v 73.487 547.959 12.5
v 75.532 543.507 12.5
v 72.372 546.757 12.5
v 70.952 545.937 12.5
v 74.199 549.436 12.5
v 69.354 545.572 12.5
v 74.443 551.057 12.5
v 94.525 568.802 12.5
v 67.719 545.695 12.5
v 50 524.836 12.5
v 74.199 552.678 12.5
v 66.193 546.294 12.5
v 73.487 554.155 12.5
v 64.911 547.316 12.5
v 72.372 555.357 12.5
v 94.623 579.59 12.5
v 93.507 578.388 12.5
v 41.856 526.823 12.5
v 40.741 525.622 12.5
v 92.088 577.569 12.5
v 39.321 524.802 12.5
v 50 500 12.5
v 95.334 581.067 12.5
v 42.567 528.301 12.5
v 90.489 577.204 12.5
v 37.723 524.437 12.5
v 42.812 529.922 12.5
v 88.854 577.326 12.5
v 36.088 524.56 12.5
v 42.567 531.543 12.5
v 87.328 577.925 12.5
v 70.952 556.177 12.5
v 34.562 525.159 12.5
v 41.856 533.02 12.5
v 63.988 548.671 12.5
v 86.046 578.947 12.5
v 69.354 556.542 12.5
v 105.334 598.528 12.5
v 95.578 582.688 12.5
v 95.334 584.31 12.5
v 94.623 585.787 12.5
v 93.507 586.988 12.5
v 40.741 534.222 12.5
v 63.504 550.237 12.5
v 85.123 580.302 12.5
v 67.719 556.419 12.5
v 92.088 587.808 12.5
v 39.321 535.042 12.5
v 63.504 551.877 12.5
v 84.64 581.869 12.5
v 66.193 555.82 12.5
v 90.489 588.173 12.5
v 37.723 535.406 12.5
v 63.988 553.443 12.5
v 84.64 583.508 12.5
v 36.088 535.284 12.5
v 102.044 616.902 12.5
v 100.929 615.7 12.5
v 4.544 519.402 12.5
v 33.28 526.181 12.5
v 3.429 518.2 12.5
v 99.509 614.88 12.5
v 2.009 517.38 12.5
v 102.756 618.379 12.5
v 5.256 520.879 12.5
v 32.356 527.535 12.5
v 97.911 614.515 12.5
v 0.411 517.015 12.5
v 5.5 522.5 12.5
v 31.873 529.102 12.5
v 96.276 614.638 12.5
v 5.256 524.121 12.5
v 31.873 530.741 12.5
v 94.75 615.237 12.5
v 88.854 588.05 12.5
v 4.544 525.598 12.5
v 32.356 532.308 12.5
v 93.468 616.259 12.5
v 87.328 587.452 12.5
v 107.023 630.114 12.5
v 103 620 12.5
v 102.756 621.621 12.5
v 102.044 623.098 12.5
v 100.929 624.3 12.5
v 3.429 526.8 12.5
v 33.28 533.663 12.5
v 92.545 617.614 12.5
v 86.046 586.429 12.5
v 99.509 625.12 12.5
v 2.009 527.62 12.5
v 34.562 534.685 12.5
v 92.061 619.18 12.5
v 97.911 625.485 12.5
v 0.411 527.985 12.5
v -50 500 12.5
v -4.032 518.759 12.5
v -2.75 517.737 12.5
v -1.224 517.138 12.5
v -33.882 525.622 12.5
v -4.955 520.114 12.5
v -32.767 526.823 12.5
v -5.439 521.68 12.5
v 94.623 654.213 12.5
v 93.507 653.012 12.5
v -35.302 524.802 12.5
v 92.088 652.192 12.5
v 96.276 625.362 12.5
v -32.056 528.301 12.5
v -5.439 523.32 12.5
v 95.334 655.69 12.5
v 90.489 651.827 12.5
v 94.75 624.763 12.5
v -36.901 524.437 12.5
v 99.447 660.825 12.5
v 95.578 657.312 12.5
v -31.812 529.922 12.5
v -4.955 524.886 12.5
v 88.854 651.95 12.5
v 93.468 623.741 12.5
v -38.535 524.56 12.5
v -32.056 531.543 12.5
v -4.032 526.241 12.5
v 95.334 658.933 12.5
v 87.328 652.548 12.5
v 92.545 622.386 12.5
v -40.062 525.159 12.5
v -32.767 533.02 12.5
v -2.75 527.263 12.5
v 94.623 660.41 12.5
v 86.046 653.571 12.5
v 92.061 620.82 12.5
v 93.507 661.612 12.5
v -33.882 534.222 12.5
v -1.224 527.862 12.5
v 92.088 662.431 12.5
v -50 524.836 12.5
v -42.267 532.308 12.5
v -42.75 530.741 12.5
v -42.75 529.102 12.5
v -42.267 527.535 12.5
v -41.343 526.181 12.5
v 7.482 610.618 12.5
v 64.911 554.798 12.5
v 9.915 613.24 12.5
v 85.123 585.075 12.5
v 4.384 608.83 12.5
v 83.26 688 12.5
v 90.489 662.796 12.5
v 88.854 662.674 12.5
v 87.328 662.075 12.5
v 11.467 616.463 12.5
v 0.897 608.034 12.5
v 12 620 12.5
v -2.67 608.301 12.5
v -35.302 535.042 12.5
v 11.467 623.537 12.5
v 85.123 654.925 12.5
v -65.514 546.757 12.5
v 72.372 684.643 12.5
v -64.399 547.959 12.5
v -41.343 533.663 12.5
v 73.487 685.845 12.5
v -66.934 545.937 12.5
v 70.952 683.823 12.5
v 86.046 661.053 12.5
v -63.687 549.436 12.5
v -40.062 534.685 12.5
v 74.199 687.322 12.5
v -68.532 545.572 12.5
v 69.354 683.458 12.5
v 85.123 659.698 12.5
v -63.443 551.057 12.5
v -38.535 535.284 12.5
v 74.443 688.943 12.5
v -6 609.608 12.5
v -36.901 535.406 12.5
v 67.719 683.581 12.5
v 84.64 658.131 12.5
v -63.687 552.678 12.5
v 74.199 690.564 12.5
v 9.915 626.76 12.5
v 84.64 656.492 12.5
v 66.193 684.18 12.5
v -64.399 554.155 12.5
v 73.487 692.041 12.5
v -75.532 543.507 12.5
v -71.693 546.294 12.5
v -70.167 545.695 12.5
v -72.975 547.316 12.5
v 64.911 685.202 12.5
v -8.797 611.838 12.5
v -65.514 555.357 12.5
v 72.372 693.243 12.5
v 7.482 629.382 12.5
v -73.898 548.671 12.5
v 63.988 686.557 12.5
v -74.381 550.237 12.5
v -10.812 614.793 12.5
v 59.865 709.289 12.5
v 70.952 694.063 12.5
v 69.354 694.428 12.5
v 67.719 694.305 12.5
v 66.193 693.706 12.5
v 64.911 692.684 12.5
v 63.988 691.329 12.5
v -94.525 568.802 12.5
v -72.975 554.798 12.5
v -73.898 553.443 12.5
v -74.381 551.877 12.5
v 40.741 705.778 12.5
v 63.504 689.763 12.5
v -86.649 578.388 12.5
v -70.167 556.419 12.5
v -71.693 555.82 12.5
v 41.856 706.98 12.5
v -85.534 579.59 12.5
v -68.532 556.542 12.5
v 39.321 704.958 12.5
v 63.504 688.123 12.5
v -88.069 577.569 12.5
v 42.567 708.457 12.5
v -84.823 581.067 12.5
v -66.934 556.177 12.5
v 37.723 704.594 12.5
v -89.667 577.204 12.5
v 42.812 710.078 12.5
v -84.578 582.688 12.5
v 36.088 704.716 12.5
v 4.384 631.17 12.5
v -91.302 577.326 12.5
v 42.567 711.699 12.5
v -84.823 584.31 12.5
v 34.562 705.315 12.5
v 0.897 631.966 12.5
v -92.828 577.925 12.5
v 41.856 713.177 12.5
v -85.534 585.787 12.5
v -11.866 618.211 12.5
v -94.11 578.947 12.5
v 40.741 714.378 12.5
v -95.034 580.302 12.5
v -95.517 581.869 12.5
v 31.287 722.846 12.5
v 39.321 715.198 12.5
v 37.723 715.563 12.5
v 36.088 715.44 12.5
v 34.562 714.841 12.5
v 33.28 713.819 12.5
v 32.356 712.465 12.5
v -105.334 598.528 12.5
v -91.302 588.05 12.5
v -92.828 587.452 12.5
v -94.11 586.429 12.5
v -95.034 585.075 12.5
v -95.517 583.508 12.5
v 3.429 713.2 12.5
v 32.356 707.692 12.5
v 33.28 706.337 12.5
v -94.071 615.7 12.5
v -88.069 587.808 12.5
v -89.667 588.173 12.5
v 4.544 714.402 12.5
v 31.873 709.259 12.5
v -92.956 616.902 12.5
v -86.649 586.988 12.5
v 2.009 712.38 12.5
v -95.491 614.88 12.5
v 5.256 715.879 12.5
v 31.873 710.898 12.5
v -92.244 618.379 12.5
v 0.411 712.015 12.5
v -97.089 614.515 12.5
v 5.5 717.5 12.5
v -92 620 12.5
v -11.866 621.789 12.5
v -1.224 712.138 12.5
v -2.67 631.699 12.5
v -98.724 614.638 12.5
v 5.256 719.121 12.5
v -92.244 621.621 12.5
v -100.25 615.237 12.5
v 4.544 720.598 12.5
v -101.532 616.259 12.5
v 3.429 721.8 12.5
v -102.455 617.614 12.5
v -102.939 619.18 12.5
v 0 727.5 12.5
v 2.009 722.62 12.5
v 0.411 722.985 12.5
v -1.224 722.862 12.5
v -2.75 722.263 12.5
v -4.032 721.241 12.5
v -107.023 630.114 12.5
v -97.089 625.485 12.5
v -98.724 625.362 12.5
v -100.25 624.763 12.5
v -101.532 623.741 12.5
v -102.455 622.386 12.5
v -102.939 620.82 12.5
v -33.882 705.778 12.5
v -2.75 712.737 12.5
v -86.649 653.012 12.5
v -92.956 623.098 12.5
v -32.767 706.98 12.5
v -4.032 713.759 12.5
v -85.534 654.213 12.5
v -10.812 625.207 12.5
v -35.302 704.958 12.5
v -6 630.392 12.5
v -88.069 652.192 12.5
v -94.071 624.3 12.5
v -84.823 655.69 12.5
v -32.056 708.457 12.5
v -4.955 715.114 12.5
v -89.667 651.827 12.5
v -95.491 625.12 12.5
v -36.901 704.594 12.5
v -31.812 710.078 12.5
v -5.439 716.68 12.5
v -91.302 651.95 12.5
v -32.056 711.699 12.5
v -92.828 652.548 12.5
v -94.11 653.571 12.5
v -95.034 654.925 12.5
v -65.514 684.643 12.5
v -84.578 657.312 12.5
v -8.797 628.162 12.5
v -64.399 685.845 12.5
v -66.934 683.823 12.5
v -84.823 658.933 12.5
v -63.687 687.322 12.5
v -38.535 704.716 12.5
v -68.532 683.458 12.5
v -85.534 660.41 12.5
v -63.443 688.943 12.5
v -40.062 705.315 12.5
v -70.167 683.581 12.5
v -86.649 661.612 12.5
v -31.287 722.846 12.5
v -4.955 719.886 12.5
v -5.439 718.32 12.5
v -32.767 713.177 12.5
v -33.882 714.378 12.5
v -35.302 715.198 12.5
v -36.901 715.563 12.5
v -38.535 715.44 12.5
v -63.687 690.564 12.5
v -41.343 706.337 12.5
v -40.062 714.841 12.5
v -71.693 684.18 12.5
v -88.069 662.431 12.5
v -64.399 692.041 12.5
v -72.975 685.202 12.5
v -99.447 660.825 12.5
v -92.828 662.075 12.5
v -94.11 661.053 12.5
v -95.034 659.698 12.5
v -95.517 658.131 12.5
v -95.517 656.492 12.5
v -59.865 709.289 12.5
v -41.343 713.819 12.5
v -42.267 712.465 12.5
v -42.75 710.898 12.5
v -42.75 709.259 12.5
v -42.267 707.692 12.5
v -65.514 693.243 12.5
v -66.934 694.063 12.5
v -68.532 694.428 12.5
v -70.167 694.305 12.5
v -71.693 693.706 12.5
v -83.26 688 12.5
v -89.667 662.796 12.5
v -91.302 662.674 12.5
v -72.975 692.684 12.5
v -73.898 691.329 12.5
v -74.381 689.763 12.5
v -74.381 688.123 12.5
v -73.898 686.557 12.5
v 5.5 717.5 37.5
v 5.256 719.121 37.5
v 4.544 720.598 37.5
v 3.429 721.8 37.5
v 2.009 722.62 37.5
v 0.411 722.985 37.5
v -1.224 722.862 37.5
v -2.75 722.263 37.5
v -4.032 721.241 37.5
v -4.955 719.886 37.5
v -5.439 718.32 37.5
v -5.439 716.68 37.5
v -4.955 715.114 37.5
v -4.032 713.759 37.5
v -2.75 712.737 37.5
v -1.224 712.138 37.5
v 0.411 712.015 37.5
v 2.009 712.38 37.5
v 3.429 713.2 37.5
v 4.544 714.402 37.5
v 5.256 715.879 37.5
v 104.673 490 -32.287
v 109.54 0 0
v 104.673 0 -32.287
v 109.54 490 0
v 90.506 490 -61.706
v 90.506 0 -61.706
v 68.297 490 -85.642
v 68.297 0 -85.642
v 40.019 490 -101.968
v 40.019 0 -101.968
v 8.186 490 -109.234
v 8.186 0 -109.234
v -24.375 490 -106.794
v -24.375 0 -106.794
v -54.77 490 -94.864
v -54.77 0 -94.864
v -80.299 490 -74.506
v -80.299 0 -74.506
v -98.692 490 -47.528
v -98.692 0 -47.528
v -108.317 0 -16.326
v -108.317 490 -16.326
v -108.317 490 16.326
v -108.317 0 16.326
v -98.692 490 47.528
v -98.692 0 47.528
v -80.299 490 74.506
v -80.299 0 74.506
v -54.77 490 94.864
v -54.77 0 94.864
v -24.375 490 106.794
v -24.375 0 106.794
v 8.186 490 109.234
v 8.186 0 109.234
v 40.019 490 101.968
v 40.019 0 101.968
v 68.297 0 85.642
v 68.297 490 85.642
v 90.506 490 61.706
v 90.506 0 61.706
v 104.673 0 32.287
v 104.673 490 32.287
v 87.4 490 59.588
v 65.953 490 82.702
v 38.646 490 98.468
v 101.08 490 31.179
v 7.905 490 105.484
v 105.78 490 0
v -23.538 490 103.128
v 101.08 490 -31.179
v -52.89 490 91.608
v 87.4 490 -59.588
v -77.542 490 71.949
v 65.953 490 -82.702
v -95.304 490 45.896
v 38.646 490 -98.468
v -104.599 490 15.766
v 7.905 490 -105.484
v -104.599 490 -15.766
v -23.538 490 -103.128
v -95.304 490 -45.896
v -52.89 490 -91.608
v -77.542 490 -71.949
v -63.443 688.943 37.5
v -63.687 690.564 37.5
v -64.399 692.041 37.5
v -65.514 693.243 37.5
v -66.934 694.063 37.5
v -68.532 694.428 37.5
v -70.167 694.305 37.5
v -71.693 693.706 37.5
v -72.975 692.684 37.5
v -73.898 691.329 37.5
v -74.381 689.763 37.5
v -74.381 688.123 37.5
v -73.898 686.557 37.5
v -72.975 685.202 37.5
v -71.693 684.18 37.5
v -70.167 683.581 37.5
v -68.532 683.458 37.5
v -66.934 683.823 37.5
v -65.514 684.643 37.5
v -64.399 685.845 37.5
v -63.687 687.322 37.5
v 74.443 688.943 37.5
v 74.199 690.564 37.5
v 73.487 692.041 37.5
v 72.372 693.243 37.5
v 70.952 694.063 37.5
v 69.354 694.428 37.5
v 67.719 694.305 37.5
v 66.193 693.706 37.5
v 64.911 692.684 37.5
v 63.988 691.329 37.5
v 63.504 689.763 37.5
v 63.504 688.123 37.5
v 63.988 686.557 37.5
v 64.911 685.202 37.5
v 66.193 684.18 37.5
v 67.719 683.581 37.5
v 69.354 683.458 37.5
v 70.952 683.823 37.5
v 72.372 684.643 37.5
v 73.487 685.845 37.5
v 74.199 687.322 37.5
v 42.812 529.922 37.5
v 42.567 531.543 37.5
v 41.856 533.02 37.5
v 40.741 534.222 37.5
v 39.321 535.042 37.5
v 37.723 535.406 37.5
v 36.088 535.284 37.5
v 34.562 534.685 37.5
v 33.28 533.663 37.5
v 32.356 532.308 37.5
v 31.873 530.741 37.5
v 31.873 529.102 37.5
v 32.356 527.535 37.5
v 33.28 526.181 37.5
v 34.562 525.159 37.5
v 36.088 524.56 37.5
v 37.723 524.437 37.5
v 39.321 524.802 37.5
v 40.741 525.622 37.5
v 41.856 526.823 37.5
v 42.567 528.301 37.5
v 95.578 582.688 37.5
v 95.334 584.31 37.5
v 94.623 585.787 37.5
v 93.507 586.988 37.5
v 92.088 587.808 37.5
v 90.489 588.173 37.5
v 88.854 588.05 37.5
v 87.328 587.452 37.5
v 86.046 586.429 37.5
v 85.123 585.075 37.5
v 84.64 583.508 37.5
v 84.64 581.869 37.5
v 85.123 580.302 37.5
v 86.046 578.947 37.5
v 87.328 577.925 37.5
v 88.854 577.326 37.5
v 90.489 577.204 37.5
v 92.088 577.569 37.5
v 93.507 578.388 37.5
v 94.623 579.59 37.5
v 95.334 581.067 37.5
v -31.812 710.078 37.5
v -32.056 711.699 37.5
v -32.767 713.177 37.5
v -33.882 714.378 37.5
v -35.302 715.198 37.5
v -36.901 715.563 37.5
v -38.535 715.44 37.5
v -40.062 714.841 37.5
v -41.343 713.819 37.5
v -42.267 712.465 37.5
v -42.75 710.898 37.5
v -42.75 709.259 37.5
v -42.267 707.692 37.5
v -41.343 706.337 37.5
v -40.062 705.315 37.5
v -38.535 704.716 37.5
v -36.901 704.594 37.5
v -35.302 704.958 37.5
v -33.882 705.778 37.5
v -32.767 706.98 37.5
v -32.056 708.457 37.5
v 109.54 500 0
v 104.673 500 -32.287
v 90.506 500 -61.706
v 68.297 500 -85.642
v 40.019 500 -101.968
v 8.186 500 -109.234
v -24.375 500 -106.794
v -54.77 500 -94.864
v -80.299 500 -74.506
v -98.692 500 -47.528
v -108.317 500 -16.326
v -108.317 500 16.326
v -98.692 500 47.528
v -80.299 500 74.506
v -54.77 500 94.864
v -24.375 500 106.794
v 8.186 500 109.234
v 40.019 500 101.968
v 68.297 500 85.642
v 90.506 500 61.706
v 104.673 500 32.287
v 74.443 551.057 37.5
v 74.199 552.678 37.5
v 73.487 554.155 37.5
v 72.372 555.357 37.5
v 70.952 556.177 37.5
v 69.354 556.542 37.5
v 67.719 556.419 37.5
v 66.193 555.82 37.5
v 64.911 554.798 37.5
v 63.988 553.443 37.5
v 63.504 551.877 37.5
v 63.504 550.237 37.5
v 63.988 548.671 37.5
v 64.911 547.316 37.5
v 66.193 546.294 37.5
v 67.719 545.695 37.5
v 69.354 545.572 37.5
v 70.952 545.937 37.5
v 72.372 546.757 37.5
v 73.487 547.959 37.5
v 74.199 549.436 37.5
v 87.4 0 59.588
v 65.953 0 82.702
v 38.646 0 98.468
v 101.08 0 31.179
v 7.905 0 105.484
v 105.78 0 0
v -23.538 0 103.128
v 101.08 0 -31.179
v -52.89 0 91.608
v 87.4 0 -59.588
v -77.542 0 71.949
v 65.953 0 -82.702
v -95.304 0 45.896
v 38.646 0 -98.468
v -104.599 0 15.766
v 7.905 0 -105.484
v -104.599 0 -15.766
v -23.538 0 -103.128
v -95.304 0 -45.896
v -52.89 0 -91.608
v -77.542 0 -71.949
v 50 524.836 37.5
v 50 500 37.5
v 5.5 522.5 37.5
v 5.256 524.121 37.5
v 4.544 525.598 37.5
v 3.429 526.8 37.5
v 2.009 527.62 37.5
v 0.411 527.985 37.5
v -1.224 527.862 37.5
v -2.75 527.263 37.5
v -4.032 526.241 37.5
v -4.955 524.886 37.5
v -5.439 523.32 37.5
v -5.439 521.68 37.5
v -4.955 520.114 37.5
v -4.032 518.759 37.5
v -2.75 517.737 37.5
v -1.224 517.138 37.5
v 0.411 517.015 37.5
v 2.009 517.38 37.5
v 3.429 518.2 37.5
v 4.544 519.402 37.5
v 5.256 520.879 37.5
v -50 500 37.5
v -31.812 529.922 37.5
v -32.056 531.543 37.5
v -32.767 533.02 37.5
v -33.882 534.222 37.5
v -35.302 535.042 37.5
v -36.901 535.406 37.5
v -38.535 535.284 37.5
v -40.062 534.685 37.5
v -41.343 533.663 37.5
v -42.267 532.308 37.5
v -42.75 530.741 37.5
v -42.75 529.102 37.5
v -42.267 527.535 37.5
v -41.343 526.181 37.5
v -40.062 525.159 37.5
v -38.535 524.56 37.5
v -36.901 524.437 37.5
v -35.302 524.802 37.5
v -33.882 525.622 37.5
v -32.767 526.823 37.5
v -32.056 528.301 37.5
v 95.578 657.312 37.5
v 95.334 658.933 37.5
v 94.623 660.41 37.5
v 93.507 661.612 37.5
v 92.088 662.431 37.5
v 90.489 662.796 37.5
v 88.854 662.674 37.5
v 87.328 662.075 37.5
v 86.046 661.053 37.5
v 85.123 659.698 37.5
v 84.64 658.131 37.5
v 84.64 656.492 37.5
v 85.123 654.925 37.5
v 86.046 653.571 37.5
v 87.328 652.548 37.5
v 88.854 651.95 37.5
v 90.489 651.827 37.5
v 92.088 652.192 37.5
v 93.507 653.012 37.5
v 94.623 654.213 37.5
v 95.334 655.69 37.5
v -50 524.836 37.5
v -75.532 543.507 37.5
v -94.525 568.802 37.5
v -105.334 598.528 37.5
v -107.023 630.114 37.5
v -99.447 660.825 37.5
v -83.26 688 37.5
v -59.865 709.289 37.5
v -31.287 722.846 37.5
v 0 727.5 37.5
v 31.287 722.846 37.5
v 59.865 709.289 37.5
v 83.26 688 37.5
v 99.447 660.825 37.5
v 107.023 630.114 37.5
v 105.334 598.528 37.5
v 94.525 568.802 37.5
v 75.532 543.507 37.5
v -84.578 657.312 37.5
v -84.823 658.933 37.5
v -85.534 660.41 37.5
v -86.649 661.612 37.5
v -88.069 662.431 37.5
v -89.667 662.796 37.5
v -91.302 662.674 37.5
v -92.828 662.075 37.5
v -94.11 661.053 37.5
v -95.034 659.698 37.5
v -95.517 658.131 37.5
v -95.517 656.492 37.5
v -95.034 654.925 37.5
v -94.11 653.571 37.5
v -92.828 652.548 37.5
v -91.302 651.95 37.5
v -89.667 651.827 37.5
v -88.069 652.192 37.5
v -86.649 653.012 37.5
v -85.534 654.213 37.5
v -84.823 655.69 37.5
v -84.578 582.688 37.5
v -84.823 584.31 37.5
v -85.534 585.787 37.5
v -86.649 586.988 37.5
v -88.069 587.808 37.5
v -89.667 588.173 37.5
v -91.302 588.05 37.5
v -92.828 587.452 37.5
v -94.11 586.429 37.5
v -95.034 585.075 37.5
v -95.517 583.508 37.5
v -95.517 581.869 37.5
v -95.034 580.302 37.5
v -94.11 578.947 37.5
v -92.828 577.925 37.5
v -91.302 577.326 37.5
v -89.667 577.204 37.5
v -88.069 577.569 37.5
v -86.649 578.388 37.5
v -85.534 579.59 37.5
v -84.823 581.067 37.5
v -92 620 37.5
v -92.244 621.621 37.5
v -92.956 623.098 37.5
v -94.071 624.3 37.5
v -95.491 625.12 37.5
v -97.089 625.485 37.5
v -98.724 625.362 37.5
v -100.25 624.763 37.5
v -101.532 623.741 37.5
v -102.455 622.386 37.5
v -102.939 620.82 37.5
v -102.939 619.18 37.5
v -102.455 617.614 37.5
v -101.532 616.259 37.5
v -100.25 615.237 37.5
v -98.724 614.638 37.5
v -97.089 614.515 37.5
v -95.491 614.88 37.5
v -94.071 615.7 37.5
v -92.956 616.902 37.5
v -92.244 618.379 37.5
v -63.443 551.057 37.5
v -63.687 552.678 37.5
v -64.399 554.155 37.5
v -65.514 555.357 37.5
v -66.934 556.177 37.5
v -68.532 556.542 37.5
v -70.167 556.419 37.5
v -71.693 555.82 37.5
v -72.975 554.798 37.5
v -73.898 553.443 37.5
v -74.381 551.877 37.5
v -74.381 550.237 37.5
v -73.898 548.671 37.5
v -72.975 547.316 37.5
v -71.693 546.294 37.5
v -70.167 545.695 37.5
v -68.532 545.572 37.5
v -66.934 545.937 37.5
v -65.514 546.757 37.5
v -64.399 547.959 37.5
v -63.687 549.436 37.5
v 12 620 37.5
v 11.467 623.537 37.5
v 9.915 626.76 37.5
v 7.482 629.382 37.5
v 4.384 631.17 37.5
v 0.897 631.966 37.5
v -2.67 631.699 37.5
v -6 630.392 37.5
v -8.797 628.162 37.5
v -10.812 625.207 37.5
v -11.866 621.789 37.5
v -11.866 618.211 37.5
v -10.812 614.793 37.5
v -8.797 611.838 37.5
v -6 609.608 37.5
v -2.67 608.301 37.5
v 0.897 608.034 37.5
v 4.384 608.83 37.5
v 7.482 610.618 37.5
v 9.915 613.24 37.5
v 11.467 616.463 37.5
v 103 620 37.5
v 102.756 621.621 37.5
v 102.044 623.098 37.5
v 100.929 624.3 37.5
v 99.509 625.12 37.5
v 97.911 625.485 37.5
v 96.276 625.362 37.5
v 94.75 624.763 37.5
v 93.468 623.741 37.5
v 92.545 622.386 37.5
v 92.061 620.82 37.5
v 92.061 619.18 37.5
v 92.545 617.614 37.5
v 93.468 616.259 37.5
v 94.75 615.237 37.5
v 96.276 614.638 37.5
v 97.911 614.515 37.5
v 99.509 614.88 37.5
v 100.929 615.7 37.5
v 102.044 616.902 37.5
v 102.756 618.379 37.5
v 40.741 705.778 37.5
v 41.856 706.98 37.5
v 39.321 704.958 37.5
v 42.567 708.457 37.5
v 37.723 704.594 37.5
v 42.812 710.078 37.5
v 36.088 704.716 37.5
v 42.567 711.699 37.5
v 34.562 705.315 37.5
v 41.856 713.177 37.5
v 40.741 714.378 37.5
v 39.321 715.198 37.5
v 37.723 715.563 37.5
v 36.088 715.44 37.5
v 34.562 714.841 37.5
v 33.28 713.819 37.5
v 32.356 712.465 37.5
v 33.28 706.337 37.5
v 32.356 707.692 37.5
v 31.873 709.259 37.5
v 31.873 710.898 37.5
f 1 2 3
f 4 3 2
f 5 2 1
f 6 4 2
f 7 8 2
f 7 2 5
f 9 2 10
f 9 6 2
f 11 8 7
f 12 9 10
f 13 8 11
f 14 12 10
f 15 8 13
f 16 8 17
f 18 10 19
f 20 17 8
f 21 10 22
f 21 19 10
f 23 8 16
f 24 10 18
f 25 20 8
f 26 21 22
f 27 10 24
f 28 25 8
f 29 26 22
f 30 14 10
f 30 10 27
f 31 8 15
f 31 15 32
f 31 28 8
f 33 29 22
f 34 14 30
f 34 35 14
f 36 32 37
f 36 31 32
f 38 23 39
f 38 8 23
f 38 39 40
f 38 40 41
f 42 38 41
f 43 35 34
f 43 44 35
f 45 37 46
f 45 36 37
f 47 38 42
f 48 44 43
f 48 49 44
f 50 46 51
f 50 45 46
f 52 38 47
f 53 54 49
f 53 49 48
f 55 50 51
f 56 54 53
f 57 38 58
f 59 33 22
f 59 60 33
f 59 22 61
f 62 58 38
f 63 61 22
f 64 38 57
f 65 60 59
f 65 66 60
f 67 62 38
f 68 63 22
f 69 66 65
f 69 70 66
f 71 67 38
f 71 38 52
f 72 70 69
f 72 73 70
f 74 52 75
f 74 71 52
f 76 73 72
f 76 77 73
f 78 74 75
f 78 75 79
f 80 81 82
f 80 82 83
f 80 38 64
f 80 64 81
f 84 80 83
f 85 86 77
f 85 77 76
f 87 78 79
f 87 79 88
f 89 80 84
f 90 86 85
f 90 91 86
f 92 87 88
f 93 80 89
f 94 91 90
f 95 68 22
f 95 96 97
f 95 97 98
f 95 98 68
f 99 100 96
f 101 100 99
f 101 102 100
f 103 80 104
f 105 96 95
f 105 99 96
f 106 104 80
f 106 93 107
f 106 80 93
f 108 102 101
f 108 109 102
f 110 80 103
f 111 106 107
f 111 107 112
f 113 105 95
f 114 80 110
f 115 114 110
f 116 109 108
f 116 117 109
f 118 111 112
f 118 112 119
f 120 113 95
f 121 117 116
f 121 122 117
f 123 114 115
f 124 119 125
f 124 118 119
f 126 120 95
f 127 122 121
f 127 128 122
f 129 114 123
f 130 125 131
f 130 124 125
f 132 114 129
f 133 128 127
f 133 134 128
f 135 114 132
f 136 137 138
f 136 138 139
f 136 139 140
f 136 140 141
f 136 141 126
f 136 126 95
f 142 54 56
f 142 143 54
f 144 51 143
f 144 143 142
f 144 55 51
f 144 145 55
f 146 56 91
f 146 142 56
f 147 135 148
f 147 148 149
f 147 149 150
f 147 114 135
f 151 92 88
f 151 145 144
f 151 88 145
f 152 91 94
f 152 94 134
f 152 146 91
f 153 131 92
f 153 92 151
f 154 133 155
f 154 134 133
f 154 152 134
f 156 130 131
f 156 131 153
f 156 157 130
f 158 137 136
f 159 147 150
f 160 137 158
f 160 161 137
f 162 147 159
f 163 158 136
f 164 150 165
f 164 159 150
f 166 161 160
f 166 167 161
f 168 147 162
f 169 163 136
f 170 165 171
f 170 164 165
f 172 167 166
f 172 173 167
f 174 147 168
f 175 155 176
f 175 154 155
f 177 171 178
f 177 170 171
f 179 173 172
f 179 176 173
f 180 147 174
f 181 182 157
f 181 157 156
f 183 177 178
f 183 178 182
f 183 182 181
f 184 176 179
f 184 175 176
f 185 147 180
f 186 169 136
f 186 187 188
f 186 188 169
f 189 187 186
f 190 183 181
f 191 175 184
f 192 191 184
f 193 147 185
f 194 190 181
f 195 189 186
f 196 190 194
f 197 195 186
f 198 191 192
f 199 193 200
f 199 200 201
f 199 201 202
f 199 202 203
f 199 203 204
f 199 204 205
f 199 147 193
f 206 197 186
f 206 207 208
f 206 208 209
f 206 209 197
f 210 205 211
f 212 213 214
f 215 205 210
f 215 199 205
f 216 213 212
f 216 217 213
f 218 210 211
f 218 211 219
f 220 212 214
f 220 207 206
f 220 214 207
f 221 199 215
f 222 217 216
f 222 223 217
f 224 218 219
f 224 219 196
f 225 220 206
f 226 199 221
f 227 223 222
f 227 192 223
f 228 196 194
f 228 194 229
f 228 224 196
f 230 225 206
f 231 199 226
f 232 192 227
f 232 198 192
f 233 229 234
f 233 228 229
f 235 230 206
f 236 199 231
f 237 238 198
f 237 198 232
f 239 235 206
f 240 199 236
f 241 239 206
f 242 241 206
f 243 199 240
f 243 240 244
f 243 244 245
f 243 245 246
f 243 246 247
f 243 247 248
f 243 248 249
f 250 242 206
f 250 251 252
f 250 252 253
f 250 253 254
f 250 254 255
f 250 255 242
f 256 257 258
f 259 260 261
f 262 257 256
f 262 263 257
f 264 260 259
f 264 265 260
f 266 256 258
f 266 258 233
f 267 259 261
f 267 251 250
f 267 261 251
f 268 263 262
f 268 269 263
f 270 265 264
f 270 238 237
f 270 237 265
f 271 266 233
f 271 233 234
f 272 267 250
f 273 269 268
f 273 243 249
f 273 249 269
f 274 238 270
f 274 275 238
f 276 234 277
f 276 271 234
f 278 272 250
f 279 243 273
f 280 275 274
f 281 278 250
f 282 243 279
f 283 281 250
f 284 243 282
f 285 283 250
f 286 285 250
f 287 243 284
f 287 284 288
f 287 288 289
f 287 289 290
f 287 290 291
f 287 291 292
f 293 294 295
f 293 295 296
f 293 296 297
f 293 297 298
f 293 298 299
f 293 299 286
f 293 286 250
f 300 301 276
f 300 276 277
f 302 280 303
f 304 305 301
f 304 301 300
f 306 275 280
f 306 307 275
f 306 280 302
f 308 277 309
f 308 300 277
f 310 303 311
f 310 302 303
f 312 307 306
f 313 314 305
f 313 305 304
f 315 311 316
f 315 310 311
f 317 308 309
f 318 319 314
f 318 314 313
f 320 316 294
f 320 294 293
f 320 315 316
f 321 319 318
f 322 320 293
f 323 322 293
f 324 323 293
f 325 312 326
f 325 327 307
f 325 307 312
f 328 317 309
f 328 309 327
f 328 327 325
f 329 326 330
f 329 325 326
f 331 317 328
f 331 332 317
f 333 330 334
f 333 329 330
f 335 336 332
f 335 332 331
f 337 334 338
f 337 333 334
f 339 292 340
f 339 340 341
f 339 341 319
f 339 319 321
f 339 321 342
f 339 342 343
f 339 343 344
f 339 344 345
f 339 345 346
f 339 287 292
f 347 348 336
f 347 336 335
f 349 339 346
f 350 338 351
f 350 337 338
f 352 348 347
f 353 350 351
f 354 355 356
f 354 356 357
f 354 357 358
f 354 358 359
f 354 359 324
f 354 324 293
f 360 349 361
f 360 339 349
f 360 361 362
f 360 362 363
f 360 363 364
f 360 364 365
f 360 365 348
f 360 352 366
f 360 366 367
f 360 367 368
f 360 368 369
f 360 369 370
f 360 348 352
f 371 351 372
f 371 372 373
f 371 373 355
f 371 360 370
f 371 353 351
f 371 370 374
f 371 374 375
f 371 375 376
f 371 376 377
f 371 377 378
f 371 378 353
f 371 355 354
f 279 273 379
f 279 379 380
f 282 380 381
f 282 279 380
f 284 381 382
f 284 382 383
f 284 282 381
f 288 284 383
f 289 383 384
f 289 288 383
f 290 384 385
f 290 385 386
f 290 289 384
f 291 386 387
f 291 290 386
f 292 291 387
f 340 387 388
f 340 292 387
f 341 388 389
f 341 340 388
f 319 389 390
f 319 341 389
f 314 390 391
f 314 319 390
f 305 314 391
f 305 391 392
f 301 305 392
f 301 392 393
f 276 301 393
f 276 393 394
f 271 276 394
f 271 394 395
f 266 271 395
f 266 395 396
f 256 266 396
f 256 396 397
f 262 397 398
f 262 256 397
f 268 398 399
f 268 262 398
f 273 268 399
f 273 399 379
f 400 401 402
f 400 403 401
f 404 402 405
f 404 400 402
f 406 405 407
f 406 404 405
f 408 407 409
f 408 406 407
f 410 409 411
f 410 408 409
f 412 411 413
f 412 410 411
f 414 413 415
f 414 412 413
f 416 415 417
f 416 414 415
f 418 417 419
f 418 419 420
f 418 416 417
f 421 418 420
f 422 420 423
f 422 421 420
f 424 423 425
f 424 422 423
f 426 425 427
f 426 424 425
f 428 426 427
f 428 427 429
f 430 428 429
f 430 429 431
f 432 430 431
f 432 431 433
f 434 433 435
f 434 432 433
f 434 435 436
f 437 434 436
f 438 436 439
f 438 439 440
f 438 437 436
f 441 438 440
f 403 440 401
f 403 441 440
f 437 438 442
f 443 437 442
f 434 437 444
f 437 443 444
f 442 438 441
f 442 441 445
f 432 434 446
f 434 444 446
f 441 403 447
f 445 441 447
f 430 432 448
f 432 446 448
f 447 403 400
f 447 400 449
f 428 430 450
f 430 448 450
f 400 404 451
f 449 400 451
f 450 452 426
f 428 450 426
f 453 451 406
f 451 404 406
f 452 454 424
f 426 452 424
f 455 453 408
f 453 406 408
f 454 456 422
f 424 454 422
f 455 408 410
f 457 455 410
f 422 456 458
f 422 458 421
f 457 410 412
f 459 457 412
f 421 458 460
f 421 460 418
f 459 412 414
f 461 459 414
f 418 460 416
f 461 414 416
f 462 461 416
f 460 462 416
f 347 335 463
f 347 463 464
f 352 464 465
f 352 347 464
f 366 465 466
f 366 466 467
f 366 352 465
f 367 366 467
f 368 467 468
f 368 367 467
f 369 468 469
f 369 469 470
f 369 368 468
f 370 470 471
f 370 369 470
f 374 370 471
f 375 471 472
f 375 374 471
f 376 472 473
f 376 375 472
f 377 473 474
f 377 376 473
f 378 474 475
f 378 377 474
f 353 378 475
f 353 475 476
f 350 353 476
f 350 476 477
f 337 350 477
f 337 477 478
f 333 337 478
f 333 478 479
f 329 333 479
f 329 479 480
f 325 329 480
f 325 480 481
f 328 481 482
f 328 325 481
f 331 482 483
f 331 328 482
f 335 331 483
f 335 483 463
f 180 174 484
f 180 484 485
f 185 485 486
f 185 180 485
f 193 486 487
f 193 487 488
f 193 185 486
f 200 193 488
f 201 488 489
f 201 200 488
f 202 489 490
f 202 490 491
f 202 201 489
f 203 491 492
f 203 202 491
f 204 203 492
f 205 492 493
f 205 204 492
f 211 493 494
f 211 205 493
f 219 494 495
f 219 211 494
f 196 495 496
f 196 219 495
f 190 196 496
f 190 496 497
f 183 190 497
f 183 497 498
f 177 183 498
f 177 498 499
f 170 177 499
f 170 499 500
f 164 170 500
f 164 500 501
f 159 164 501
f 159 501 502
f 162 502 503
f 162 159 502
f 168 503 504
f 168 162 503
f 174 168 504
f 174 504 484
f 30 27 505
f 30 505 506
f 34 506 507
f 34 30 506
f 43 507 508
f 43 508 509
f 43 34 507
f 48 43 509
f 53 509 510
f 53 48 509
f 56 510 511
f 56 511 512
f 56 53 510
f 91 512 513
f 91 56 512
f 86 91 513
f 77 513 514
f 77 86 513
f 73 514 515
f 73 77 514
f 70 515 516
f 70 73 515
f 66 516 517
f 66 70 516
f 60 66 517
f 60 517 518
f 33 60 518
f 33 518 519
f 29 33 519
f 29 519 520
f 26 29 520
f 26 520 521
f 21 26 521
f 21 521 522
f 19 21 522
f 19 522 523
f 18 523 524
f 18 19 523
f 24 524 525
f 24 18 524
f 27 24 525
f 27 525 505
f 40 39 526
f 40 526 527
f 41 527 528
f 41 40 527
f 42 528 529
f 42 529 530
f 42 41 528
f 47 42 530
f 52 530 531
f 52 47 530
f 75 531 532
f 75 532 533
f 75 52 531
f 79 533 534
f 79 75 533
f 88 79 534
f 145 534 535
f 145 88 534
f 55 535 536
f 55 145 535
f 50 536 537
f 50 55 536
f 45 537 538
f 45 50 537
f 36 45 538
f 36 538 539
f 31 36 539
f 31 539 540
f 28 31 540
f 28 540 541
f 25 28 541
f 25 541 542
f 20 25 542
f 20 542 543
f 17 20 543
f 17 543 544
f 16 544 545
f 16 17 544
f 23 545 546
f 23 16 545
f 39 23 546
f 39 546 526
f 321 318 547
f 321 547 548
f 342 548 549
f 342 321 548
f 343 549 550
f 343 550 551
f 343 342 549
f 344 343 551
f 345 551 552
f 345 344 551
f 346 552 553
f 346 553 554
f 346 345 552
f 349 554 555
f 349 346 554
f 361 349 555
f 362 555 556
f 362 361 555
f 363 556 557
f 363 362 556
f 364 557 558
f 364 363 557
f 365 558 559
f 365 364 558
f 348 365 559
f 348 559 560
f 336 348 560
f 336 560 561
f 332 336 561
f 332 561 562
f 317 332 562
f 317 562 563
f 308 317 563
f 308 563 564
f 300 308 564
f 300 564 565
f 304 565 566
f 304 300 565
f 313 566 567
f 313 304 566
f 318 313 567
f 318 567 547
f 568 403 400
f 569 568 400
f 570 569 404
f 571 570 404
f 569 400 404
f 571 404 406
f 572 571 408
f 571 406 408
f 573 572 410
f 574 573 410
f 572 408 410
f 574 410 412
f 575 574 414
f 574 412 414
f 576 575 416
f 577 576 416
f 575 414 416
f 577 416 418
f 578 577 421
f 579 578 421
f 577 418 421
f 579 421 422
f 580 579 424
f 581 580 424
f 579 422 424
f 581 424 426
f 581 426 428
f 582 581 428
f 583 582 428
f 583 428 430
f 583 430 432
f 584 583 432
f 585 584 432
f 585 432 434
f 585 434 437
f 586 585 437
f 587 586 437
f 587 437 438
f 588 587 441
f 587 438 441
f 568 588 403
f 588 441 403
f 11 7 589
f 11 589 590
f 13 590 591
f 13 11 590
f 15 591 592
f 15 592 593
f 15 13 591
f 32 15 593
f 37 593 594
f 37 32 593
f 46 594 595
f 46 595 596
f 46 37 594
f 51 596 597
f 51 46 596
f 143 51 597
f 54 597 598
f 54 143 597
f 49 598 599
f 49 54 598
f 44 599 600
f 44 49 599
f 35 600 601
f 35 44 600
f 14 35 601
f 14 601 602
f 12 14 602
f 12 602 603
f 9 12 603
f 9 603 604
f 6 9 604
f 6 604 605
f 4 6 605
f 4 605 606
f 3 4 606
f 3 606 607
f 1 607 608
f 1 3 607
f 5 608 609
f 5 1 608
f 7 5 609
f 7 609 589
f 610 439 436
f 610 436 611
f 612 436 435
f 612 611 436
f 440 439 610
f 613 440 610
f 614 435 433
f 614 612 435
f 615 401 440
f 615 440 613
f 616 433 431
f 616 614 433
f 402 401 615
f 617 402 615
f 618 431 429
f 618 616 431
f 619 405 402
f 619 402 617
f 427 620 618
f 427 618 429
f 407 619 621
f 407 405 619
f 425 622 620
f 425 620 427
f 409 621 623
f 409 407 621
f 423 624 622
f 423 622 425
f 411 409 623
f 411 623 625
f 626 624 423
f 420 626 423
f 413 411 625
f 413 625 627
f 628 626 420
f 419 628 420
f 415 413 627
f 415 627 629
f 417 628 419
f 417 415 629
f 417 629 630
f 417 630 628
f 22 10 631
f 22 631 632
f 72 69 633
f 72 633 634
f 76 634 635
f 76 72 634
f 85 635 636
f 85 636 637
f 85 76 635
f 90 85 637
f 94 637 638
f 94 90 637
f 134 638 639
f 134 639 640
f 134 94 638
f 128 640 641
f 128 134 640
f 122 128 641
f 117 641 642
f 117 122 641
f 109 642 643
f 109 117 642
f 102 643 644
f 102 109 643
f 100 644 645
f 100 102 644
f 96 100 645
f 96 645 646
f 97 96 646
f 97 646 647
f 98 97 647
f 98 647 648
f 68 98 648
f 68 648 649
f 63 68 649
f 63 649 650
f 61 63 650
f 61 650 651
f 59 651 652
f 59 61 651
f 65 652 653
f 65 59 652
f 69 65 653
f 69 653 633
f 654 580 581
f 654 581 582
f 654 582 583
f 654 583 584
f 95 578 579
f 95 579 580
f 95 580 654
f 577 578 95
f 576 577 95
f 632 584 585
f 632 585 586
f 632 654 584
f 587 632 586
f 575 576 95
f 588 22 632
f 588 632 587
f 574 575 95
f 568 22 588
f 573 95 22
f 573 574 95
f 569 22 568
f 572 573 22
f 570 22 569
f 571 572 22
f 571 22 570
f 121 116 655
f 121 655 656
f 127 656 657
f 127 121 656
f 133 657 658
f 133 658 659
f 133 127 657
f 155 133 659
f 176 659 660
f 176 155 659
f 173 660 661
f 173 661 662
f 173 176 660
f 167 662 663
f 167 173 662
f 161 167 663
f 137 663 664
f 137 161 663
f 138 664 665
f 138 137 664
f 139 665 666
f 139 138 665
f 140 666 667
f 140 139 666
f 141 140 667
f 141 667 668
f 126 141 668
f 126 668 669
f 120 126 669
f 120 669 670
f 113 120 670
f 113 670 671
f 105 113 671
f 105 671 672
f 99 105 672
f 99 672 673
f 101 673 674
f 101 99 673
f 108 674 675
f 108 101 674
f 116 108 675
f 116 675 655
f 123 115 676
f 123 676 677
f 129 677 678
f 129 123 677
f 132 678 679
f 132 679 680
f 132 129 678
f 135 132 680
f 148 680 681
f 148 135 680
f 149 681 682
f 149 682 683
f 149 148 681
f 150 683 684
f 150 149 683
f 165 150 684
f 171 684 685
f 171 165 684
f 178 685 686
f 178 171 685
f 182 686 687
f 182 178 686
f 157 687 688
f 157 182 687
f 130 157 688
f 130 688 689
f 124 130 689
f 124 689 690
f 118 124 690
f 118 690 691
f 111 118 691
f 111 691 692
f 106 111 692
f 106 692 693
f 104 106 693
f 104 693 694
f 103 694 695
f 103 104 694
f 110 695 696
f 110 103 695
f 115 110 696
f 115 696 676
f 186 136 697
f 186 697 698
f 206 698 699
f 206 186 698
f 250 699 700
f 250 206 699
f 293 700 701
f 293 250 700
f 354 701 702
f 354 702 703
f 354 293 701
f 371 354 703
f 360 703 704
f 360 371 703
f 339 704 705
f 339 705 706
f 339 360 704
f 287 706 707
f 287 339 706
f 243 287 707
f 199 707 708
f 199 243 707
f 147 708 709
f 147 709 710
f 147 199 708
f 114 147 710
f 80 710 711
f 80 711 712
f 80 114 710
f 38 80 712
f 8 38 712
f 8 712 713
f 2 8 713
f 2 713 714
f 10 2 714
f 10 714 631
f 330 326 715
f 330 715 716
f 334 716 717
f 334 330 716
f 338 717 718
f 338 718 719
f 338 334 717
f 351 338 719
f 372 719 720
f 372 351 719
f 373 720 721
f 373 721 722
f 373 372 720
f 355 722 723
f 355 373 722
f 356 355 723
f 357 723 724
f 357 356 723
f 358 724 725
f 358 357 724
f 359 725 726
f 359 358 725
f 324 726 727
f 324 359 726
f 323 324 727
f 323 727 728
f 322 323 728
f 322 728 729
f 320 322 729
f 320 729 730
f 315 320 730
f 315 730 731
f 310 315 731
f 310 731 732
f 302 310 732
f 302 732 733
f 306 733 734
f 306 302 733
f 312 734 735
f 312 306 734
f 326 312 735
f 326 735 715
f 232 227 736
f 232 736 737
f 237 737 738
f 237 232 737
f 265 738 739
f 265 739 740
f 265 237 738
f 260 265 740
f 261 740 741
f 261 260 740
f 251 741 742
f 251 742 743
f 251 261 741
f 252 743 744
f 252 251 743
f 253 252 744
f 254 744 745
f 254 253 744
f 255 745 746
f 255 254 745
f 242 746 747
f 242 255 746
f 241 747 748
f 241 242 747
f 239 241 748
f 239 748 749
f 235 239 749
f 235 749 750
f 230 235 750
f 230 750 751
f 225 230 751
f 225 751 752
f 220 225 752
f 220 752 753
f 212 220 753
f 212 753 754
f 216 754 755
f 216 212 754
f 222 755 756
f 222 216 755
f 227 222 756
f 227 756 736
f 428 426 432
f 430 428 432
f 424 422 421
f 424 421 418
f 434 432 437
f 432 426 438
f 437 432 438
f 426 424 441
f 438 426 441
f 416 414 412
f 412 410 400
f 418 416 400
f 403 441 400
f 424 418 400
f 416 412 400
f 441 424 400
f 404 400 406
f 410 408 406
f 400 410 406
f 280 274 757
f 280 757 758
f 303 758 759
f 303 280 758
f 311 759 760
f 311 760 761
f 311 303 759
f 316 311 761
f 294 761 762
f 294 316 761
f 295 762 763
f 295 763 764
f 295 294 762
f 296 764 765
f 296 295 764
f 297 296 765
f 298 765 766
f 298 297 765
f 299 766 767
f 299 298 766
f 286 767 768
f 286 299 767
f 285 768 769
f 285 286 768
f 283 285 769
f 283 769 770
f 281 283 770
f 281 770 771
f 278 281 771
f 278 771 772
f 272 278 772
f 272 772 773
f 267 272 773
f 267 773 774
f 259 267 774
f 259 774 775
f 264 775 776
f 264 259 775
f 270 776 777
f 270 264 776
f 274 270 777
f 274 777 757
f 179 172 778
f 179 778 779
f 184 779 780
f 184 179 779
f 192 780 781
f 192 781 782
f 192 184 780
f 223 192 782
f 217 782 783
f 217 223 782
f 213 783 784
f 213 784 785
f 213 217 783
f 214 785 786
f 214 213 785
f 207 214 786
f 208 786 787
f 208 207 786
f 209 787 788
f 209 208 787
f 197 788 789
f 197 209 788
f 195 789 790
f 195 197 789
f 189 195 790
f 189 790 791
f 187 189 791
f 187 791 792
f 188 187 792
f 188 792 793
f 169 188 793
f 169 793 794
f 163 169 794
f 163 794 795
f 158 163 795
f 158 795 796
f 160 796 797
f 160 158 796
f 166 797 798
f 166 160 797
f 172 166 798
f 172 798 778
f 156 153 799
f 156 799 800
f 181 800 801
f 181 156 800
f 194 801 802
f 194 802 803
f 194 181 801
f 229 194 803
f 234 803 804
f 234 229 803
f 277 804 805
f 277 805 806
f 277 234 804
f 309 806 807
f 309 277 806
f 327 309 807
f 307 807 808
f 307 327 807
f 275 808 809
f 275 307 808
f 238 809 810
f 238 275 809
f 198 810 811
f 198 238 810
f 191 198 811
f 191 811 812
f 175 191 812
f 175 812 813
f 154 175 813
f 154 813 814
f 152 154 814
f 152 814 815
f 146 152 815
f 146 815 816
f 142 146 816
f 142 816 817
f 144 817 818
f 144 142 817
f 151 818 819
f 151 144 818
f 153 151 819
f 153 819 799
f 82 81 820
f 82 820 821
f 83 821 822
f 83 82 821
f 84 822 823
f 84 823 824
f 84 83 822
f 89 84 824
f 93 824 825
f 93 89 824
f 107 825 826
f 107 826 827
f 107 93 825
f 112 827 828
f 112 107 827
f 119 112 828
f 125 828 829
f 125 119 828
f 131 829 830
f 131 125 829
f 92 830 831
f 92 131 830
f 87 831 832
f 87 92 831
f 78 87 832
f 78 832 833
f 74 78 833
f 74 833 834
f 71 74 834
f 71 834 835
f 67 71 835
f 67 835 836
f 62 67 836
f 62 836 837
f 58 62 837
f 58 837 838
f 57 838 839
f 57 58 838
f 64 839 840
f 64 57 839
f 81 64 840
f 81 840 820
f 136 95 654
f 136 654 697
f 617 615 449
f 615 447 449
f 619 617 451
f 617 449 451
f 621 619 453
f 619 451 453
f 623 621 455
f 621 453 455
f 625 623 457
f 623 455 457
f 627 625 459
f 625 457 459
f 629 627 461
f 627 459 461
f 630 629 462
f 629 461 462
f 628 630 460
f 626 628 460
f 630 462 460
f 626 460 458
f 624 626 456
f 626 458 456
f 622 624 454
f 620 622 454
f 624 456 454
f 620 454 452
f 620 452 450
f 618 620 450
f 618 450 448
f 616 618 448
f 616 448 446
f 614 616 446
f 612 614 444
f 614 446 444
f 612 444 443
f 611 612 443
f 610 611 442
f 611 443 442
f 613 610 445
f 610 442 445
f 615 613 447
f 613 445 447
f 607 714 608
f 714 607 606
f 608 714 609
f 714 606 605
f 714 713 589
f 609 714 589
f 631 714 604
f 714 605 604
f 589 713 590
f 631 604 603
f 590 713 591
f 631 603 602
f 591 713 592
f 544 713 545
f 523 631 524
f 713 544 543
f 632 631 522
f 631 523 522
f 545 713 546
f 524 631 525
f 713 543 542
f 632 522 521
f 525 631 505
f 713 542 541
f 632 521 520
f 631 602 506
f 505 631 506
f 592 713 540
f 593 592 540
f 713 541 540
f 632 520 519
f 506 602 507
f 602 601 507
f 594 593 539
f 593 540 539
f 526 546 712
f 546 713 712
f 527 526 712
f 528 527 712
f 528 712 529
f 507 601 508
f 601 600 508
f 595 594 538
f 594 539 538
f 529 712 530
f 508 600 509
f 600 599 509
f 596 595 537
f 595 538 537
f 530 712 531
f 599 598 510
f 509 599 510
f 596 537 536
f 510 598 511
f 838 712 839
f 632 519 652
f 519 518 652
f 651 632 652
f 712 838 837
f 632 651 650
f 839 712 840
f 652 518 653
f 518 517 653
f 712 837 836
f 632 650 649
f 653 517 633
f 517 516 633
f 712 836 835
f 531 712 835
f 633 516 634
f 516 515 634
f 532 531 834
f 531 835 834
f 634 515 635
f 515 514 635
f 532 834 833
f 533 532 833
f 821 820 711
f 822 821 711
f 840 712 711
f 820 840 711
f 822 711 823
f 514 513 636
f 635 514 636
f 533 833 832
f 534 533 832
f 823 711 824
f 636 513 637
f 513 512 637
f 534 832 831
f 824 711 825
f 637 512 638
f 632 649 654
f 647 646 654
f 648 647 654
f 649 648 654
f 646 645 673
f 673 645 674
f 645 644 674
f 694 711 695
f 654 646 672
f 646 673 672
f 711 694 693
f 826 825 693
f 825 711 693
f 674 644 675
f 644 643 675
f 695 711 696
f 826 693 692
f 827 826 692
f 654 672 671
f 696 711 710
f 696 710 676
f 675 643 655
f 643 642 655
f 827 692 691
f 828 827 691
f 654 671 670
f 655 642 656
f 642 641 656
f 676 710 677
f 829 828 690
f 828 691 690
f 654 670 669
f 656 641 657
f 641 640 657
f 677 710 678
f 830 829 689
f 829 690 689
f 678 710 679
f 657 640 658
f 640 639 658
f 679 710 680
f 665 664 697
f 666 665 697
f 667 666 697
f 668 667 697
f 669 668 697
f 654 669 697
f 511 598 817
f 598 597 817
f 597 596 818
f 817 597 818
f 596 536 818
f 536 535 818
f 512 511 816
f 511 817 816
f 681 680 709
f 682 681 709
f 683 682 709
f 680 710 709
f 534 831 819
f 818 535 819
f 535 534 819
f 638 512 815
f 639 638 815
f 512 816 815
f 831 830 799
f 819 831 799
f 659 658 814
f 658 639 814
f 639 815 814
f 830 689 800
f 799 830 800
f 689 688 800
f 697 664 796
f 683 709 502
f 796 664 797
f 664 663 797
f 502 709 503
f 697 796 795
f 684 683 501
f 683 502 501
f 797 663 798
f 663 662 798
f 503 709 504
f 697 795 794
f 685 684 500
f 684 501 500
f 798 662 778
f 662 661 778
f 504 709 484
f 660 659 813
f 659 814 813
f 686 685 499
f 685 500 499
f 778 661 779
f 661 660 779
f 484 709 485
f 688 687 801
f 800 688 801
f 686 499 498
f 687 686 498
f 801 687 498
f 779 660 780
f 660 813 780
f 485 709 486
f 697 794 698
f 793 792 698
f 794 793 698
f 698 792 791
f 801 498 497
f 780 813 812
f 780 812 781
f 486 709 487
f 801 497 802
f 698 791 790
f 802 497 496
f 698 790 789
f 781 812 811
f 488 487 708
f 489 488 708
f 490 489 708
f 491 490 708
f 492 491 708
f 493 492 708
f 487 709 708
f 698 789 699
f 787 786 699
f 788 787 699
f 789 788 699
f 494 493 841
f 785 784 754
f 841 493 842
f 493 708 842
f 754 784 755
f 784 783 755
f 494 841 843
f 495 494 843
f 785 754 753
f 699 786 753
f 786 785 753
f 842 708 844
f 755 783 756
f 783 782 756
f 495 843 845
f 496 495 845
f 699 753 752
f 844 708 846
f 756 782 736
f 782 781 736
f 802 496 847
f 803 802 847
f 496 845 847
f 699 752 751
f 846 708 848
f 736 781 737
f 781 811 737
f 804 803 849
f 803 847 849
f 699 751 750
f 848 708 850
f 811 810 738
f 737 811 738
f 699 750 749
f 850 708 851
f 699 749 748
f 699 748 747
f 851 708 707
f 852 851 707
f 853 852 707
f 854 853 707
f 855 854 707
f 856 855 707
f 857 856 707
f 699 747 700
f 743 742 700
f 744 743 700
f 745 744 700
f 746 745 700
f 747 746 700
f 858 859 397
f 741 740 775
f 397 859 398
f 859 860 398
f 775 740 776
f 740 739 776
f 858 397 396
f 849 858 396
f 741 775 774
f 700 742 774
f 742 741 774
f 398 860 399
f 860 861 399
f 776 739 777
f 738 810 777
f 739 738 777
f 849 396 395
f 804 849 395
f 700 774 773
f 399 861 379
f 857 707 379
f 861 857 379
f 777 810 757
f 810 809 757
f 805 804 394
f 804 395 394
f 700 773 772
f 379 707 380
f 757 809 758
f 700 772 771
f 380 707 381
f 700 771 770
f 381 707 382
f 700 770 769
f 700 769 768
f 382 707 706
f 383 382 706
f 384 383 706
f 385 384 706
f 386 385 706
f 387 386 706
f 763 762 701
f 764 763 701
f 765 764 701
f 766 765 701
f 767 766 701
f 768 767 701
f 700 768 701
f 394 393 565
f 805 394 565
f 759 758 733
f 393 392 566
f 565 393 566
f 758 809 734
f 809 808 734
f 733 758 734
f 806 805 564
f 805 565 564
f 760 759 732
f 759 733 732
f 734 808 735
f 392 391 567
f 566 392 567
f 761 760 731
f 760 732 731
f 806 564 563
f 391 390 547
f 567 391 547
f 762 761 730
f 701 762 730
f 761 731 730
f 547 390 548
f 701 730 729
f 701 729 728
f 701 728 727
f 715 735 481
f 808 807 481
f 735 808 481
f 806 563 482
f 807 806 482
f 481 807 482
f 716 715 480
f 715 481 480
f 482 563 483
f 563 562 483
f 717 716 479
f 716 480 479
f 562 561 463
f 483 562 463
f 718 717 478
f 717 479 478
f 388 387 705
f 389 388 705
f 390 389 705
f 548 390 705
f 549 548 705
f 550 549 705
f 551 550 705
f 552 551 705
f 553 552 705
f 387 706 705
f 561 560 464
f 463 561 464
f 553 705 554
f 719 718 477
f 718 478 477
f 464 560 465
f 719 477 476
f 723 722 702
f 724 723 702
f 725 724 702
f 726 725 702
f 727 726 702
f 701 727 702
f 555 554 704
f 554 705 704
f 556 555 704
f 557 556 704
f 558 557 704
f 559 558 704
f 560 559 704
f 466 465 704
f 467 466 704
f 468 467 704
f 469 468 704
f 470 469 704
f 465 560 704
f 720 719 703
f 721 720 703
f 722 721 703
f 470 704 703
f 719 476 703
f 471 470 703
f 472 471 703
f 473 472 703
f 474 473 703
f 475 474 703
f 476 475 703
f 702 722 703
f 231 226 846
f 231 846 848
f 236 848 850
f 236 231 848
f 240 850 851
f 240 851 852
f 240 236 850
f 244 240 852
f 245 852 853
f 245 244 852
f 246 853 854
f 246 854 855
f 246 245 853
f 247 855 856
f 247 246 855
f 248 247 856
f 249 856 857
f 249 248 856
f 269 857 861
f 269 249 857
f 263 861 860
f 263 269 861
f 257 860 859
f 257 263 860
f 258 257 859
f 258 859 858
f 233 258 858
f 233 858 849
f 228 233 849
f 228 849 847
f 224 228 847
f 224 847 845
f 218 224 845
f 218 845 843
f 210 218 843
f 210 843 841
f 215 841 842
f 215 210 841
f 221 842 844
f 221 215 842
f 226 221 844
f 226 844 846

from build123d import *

# Parameters (mm, degrees)
ESBO_O1_W                = 3.76
ESBO_O1_H                = 490
ESBO_O3_R                = 109.54
RESSALTO_EXTRUS_O1_DEPTH = 10
RESSALTO_EXTRUS_O2_START = 12.5
ESBO_O4_R                = 12
ESBO_O4_R_2              = 5.5
RESSALTO_EXTRUS_O2_DEPTH = 25


with BuildPart() as part:
    # Esboço1 → Revolução1 (revolve)
    with BuildSketch(Plane.XY):
        with Locations((107.66, 245)):
            Rectangle(ESBO_O1_W, ESBO_O1_H)
    revolve(axis=Axis((0, 0, 0), (0, 1, 0)))


with BuildPart() as body_2:
    # Esboço3 → Ressalto-extrusão1 (new body)
    with BuildSketch(Plane(origin=(0, 490, 0), x_dir=(1, 0, 0), z_dir=(0, 1, 0))):
        Circle(ESBO_O3_R)
    extrude(amount=RESSALTO_EXTRUS_O1_DEPTH)

    # Esboço4 → Ressalto-extrusão2 (add)
    with BuildSketch(Plane.XY.offset(RESSALTO_EXTRUS_O2_START)):
        with BuildLine():
            Line((-50, 500), (-50, 524.835668447))
            ThreePointArc((-50, 524.835668447), (0, 727.5), (50, 524.835668447))
            Line((50, 524.835668447), (50, 500))
            Line((50, 500), (-50, 500))
        make_face()
        with Locations((0, 620)):
            Circle(ESBO_O4_R, mode=Mode.SUBTRACT)
        with Locations((0, 717.5)):
            Circle(ESBO_O4_R_2, mode=Mode.SUBTRACT)
        with Locations((37.311634656, 710.07825442)):
            Circle(ESBO_O4_R_2, mode=Mode.SUBTRACT)
        with Locations((68.942911166, 688.942911166)):
            Circle(ESBO_O4_R_2, mode=Mode.SUBTRACT)
        with Locations((90.07825442, 657.311634656)):
            Circle(ESBO_O4_R_2, mode=Mode.SUBTRACT)
        with Locations((97.5, 620)):
            Circle(ESBO_O4_R_2, mode=Mode.SUBTRACT)
        with Locations((90.07825442, 582.688365344)):
            Circle(ESBO_O4_R_2, mode=Mode.SUBTRACT)
        with Locations((68.942911166, 551.057088834)):
            Circle(ESBO_O4_R_2, mode=Mode.SUBTRACT)
        with Locations((37.311634656, 529.92174558)):
            Circle(ESBO_O4_R_2, mode=Mode.SUBTRACT)
        with Locations((0, 522.5)):
            Circle(ESBO_O4_R_2, mode=Mode.SUBTRACT)
        with Locations((-37.311634656, 529.92174558)):
            Circle(ESBO_O4_R_2, mode=Mode.SUBTRACT)
        with Locations((-68.942911166, 551.057088834)):
            Circle(ESBO_O4_R_2, mode=Mode.SUBTRACT)
        with Locations((-90.07825442, 582.688365344)):
            Circle(ESBO_O4_R_2, mode=Mode.SUBTRACT)
        with Locations((-97.5, 620)):
            Circle(ESBO_O4_R_2, mode=Mode.SUBTRACT)
        with Locations((-90.07825442, 657.311634656)):
            Circle(ESBO_O4_R_2, mode=Mode.SUBTRACT)
        with Locations((-68.942911166, 688.942911166)):
            Circle(ESBO_O4_R_2, mode=Mode.SUBTRACT)
        with Locations((-37.311634656, 710.07825442)):
            Circle(ESBO_O4_R_2, mode=Mode.SUBTRACT)
    extrude(amount=RESSALTO_EXTRUS_O2_DEPTH)


solid = Compound([part.part, body_2.part])
